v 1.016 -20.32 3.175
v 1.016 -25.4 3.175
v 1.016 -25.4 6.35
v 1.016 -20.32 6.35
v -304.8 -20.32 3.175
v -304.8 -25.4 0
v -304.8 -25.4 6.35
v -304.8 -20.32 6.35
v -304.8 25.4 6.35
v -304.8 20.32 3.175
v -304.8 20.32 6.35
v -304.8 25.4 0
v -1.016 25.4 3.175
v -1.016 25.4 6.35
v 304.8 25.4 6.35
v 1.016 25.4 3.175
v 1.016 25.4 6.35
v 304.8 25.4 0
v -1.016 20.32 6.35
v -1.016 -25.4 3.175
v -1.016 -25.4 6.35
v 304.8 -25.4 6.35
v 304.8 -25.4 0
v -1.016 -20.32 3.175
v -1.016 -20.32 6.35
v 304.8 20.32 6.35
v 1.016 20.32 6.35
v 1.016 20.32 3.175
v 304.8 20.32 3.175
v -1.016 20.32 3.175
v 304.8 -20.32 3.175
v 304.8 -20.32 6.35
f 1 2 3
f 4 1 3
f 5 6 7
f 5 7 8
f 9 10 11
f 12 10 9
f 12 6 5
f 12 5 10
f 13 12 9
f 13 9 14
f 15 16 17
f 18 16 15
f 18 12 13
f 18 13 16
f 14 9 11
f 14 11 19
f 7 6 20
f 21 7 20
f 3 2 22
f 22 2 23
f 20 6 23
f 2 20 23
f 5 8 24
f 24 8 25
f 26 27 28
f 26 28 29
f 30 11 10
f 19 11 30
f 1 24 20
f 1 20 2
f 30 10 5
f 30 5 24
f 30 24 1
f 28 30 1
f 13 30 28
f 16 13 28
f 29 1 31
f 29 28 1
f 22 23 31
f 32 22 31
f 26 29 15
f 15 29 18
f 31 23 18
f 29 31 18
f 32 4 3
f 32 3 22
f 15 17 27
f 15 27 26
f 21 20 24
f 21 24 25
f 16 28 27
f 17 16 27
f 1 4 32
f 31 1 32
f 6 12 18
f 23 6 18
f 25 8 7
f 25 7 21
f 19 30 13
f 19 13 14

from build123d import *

# Parameters (mm, degrees)
F0_W     = 609.6
F0_H     = 50.8
F1_DEPTH = 6.35
F2_W     = 609.6
F2_H     = 40.64
F3_DEPTH = 3.175
F4_W     = 2.032
F4_H     = 3.175
F5_DEPTH = 50.8


with BuildPart() as f1:
    # F0 (on Top) → F1 (new body)
    with BuildSketch(Plane.XY):
        Rectangle(F0_W, F0_H)
    extrude(amount=F1_DEPTH)

    # F2 (on face) → F3 (cut)
    with BuildSketch(Plane.XY.offset(6.35)):
        Rectangle(F2_W, F2_H)
    extrude(amount=-F3_DEPTH, mode=Mode.SUBTRACT)

    # F4 (on face) → F5 (cut, through all)
    with BuildSketch(Plane.XZ.offset(25.4)):
        with Locations((0, 4.7625)):
            Rectangle(F4_W, F4_H)
    extrude(amount=-F5_DEPTH, mode=Mode.SUBTRACT)


solid = f1.part
